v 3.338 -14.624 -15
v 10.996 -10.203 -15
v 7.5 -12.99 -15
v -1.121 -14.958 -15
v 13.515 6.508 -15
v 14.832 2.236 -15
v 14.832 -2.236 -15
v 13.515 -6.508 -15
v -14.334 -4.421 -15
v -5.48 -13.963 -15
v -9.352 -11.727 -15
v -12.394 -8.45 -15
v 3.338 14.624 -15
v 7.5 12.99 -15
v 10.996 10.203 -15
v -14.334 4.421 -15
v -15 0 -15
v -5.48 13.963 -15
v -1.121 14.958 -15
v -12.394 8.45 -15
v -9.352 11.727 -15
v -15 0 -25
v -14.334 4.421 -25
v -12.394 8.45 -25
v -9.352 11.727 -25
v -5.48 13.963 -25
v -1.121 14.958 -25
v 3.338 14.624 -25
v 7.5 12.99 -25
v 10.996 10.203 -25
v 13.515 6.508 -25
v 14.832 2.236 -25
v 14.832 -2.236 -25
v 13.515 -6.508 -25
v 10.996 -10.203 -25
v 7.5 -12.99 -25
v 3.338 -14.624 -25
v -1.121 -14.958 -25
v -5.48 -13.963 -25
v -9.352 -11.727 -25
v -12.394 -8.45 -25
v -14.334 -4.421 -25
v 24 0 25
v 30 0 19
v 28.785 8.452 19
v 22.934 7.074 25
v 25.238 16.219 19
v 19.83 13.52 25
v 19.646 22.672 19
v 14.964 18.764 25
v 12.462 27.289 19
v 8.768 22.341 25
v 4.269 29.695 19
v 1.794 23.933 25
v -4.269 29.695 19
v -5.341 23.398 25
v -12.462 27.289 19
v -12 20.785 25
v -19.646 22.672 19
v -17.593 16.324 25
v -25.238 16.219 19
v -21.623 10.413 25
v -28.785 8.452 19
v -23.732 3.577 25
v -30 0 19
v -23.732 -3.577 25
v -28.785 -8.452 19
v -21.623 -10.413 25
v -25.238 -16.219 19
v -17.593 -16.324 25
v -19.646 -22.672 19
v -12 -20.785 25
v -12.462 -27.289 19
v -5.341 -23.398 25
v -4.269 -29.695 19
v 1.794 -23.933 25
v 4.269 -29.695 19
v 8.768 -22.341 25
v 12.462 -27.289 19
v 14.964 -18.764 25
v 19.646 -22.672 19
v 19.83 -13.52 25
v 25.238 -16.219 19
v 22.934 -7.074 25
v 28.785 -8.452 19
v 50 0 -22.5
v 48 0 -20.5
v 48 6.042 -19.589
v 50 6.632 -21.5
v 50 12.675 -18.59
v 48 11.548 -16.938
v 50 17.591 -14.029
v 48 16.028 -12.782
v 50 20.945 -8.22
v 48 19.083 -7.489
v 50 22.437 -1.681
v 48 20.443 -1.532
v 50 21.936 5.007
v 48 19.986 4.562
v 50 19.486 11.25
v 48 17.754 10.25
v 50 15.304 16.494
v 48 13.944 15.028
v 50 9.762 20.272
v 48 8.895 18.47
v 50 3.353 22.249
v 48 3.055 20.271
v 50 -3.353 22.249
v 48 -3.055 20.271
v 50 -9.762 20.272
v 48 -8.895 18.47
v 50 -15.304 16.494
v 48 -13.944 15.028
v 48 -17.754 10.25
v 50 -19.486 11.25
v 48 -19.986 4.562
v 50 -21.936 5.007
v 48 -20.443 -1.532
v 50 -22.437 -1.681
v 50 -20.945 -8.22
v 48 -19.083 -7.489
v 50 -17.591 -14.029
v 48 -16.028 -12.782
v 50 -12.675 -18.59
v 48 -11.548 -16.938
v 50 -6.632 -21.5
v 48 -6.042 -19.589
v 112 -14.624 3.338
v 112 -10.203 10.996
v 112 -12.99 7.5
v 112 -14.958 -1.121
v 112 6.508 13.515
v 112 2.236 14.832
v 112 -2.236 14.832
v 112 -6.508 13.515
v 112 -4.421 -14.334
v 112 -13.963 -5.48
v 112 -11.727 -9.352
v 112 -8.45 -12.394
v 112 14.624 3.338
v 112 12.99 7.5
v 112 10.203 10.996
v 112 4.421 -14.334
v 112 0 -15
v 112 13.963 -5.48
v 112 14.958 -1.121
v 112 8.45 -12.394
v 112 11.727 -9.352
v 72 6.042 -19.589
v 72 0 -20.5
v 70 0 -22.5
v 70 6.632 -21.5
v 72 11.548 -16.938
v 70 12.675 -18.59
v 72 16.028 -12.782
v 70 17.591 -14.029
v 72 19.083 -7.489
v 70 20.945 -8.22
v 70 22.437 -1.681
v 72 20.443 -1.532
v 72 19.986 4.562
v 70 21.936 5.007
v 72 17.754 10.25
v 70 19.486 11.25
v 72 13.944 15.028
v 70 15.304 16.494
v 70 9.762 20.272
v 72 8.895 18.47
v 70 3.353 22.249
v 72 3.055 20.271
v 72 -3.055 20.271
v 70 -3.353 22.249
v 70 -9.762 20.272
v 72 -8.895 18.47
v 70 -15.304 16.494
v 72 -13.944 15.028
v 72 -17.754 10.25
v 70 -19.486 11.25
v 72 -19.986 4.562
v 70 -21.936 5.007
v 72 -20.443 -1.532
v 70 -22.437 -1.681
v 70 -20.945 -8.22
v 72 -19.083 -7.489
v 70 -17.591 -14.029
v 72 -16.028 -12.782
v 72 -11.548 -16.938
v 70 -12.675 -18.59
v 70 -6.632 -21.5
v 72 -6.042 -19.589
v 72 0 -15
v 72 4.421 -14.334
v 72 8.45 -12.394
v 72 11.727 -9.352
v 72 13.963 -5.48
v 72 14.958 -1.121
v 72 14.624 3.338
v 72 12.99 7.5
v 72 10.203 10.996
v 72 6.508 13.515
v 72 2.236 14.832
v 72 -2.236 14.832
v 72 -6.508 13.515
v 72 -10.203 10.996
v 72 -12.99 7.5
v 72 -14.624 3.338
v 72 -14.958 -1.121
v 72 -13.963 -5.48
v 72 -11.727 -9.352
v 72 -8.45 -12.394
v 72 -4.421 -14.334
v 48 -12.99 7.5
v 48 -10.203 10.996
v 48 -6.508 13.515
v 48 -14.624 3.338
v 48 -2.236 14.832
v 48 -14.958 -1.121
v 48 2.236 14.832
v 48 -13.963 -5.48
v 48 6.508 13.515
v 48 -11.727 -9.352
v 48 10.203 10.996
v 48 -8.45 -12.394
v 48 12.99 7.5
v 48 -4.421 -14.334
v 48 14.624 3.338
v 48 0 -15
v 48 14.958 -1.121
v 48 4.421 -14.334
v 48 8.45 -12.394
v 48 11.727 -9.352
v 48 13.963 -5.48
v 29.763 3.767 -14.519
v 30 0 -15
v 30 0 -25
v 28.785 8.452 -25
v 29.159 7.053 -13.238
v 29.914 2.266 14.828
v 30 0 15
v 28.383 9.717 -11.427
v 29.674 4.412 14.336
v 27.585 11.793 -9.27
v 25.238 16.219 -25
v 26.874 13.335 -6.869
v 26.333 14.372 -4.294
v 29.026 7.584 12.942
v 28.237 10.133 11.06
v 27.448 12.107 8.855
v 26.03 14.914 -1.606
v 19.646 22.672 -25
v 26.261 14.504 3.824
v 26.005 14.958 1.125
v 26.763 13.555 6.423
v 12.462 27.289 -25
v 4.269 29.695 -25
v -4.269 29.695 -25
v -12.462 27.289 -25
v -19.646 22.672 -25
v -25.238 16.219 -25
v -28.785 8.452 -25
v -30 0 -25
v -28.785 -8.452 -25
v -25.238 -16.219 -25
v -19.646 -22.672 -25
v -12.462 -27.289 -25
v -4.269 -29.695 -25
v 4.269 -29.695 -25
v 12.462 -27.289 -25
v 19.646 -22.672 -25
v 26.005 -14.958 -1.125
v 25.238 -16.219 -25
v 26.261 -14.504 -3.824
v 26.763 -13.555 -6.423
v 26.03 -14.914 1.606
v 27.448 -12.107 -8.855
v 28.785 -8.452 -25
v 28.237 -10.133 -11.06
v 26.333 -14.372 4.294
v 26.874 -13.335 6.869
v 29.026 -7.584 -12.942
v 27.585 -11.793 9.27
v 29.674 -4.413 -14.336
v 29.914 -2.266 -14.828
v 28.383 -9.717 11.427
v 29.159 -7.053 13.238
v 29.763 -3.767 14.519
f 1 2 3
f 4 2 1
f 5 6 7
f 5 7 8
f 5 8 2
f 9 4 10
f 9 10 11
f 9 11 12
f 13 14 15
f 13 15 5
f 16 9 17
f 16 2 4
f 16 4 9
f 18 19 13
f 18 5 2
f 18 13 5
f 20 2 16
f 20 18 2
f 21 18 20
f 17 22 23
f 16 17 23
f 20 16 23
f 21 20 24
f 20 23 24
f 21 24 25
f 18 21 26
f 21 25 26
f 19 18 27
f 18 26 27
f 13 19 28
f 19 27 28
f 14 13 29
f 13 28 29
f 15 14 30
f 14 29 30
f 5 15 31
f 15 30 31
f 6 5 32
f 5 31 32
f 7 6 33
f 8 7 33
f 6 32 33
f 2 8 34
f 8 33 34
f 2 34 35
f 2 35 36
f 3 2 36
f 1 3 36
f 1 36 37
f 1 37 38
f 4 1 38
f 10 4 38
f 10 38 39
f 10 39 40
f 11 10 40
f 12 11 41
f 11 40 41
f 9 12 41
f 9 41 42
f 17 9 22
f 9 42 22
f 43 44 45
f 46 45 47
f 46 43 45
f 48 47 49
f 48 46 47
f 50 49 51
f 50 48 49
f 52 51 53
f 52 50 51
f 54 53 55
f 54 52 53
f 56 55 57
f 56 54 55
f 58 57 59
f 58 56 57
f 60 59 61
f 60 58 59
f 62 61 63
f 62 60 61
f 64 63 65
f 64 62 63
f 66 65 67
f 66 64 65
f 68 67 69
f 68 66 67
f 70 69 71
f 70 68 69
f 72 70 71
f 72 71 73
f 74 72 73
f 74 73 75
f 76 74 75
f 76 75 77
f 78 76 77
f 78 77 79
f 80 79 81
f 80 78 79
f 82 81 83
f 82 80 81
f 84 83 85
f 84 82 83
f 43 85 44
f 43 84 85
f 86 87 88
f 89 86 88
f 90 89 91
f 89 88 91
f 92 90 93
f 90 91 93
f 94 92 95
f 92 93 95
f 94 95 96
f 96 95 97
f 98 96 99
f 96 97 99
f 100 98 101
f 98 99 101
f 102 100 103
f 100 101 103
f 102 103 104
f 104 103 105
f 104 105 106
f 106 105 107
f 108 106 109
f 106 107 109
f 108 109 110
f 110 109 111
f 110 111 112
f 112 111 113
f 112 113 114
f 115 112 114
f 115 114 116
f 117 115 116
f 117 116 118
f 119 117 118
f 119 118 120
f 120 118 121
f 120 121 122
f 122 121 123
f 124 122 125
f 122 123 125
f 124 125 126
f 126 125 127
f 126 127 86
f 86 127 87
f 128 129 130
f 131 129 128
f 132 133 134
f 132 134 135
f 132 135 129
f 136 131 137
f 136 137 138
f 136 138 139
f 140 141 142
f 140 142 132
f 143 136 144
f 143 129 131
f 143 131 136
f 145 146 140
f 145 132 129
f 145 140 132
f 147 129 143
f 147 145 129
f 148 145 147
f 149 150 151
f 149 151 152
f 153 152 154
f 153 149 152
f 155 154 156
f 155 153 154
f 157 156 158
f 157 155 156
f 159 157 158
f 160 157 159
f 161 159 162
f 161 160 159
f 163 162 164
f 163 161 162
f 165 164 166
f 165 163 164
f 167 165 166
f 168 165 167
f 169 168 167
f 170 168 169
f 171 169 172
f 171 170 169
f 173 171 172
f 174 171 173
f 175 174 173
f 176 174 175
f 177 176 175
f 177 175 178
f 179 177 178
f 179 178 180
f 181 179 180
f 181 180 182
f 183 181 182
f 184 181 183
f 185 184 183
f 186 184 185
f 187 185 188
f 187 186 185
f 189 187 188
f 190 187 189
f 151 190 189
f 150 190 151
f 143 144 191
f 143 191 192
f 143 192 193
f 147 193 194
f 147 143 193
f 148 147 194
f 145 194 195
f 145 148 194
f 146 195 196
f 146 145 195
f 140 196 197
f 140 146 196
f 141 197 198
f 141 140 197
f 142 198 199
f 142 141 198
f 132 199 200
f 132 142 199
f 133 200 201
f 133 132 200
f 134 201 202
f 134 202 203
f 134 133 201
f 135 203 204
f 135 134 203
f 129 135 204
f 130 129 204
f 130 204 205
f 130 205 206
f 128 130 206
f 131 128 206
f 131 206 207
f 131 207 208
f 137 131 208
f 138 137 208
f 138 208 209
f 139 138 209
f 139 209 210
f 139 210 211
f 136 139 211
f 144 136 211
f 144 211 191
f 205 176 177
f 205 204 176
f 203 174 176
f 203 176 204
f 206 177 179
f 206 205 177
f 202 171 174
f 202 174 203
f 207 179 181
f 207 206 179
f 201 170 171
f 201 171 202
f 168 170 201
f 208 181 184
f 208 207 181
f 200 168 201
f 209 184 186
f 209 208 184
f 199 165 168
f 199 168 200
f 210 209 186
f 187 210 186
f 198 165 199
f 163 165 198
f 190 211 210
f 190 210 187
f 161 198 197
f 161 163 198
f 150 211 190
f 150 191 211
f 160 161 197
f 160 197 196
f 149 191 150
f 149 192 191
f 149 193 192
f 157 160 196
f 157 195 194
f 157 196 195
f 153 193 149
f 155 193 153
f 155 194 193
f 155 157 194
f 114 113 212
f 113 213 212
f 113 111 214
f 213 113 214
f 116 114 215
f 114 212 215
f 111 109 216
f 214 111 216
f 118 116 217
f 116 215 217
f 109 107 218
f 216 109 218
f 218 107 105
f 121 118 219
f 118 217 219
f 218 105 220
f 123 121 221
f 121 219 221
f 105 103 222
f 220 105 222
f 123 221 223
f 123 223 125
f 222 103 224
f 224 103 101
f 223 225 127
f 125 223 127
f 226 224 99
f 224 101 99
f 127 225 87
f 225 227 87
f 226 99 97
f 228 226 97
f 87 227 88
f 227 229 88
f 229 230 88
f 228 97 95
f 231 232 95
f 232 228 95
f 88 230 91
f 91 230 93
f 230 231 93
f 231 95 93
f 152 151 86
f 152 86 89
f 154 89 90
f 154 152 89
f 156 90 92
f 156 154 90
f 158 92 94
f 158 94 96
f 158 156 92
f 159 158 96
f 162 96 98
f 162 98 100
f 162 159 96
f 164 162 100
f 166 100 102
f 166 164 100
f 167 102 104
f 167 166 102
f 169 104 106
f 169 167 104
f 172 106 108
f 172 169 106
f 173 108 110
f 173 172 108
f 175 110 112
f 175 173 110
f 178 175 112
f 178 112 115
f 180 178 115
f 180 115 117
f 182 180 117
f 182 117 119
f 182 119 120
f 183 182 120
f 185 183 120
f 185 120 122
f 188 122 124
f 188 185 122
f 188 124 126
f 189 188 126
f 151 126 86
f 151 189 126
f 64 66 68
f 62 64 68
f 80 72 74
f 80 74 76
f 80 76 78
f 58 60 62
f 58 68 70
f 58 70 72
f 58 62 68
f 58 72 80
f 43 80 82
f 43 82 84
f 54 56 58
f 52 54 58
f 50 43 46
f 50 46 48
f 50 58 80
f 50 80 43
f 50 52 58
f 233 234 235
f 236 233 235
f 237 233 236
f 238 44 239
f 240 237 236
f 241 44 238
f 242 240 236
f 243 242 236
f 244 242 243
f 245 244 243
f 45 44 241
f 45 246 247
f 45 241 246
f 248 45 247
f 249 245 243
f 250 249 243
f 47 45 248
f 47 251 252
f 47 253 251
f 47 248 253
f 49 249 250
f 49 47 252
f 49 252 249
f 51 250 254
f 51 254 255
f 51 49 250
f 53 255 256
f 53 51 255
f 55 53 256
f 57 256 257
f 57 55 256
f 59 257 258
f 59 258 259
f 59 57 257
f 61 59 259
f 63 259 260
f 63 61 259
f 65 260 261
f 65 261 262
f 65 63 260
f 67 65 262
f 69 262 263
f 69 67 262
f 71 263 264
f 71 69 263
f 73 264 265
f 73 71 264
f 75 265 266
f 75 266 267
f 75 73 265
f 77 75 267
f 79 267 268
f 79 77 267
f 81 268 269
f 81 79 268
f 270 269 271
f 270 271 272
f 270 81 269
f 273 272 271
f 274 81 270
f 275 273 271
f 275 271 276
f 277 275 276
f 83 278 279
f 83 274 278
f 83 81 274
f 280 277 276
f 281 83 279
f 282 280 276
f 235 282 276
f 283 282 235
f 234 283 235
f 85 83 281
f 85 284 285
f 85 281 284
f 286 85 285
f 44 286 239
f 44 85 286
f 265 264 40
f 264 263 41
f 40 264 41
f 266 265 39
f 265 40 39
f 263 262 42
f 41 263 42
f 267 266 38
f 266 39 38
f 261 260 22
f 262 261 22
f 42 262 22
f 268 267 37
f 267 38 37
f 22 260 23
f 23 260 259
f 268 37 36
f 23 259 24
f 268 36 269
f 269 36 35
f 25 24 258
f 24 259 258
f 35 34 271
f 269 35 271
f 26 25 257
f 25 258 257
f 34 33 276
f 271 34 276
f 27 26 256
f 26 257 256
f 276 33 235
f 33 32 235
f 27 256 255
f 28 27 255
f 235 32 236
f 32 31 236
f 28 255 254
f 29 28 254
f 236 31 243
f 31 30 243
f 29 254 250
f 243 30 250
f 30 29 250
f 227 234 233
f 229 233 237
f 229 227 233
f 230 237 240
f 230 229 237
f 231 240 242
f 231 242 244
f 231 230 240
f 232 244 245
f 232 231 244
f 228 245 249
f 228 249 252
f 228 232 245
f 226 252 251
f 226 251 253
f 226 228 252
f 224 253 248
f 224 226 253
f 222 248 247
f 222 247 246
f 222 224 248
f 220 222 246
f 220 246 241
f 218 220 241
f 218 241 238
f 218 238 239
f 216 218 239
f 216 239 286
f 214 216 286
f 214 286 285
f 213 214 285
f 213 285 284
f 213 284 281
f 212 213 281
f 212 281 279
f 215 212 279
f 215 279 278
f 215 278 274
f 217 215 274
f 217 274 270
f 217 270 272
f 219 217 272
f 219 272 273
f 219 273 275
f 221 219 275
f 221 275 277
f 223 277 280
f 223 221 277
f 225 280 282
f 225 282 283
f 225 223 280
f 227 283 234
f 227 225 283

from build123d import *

# Parameters (mm, degrees)
SKETCH1_R                = 30
BOSS_EXTRUDE1_DEPTH      = 25
CHAMFER1_SIZE            = 6
BOSS_EXTRUDE2_REACH      = 149.272
BOSS_EXTRUDE2_END_RADIUS = 30
SKETCH2_R                = 15
SKETCH3_R                = 22.5
BOSS_EXTRUDE3_DEPTH      = 24
CHAMFER2_SIZE            = 2
SKETCH4_R                = 15
CUT_EXTRUDE1_DEPTH       = 10


with BuildPart() as part:
    # Sketch1 → Boss-Extrude1 (new, symmetric)
    with BuildSketch(Plane.XY):
        Circle(SKETCH1_R)
    extrude(amount=BOSS_EXTRUDE1_DEPTH, both=True)

    # Chamfer1
    chamfer1_edges = [part.edges().sort_by_distance(p)[0] for p in [
        (-30, 0, 25),
    ]]
    chamfer(chamfer1_edges, length=CHAMFER1_SIZE)

    # Boss-Extrude2: up to this cylinder (the profile starts outside it)
    boss_extrude2_end = Plane(origin=(0, 0, 0), z_dir=(0, 0, -1)) * Cylinder(BOSS_EXTRUDE2_END_RADIUS, 359.544, mode=Mode.PRIVATE)
    # Sketch2 → Boss-Extrude2 (add, up to the surface)
    with BuildSketch(Plane(origin=(112, 0, 0), x_dir=(0, 0, -1), z_dir=(1, 0, 0)), mode=Mode.PRIVATE) as boss_extrude2_sk1:
        Circle(SKETCH2_R)
    boss_extrude2_tool1 = extrude(boss_extrude2_sk1.sketch, amount=-BOSS_EXTRUDE2_REACH, mode=Mode.PRIVATE) - boss_extrude2_end
    add(boss_extrude2_tool1.solids().sort_by_distance((112, 0, 0))[0])

    # Sketch3 → Boss-Extrude3 (add)
    with BuildSketch(Plane(origin=(72, 0, 0), x_dir=(0, 0, -1), z_dir=(1, 0, 0))):
        Circle(SKETCH3_R)
    extrude(amount=-BOSS_EXTRUDE3_DEPTH)

    # Chamfer2
    chamfer2_edges = [part.edges().sort_by_distance(p)[0] for p in [
        (48, 0, 22.5),
        (72, 0, 22.5),
    ]]
    chamfer(chamfer2_edges, length=CHAMFER2_SIZE)

    # Sketch4 → Cut-Extrude1 (cut)
    with BuildSketch(Plane(origin=(0, 0, -25), x_dir=(-1, 0, 0), z_dir=(0, 0, -1))):
        Circle(SKETCH4_R)
    extrude(amount=-CUT_EXTRUDE1_DEPTH, mode=Mode.SUBTRACT)


solid = part.part
